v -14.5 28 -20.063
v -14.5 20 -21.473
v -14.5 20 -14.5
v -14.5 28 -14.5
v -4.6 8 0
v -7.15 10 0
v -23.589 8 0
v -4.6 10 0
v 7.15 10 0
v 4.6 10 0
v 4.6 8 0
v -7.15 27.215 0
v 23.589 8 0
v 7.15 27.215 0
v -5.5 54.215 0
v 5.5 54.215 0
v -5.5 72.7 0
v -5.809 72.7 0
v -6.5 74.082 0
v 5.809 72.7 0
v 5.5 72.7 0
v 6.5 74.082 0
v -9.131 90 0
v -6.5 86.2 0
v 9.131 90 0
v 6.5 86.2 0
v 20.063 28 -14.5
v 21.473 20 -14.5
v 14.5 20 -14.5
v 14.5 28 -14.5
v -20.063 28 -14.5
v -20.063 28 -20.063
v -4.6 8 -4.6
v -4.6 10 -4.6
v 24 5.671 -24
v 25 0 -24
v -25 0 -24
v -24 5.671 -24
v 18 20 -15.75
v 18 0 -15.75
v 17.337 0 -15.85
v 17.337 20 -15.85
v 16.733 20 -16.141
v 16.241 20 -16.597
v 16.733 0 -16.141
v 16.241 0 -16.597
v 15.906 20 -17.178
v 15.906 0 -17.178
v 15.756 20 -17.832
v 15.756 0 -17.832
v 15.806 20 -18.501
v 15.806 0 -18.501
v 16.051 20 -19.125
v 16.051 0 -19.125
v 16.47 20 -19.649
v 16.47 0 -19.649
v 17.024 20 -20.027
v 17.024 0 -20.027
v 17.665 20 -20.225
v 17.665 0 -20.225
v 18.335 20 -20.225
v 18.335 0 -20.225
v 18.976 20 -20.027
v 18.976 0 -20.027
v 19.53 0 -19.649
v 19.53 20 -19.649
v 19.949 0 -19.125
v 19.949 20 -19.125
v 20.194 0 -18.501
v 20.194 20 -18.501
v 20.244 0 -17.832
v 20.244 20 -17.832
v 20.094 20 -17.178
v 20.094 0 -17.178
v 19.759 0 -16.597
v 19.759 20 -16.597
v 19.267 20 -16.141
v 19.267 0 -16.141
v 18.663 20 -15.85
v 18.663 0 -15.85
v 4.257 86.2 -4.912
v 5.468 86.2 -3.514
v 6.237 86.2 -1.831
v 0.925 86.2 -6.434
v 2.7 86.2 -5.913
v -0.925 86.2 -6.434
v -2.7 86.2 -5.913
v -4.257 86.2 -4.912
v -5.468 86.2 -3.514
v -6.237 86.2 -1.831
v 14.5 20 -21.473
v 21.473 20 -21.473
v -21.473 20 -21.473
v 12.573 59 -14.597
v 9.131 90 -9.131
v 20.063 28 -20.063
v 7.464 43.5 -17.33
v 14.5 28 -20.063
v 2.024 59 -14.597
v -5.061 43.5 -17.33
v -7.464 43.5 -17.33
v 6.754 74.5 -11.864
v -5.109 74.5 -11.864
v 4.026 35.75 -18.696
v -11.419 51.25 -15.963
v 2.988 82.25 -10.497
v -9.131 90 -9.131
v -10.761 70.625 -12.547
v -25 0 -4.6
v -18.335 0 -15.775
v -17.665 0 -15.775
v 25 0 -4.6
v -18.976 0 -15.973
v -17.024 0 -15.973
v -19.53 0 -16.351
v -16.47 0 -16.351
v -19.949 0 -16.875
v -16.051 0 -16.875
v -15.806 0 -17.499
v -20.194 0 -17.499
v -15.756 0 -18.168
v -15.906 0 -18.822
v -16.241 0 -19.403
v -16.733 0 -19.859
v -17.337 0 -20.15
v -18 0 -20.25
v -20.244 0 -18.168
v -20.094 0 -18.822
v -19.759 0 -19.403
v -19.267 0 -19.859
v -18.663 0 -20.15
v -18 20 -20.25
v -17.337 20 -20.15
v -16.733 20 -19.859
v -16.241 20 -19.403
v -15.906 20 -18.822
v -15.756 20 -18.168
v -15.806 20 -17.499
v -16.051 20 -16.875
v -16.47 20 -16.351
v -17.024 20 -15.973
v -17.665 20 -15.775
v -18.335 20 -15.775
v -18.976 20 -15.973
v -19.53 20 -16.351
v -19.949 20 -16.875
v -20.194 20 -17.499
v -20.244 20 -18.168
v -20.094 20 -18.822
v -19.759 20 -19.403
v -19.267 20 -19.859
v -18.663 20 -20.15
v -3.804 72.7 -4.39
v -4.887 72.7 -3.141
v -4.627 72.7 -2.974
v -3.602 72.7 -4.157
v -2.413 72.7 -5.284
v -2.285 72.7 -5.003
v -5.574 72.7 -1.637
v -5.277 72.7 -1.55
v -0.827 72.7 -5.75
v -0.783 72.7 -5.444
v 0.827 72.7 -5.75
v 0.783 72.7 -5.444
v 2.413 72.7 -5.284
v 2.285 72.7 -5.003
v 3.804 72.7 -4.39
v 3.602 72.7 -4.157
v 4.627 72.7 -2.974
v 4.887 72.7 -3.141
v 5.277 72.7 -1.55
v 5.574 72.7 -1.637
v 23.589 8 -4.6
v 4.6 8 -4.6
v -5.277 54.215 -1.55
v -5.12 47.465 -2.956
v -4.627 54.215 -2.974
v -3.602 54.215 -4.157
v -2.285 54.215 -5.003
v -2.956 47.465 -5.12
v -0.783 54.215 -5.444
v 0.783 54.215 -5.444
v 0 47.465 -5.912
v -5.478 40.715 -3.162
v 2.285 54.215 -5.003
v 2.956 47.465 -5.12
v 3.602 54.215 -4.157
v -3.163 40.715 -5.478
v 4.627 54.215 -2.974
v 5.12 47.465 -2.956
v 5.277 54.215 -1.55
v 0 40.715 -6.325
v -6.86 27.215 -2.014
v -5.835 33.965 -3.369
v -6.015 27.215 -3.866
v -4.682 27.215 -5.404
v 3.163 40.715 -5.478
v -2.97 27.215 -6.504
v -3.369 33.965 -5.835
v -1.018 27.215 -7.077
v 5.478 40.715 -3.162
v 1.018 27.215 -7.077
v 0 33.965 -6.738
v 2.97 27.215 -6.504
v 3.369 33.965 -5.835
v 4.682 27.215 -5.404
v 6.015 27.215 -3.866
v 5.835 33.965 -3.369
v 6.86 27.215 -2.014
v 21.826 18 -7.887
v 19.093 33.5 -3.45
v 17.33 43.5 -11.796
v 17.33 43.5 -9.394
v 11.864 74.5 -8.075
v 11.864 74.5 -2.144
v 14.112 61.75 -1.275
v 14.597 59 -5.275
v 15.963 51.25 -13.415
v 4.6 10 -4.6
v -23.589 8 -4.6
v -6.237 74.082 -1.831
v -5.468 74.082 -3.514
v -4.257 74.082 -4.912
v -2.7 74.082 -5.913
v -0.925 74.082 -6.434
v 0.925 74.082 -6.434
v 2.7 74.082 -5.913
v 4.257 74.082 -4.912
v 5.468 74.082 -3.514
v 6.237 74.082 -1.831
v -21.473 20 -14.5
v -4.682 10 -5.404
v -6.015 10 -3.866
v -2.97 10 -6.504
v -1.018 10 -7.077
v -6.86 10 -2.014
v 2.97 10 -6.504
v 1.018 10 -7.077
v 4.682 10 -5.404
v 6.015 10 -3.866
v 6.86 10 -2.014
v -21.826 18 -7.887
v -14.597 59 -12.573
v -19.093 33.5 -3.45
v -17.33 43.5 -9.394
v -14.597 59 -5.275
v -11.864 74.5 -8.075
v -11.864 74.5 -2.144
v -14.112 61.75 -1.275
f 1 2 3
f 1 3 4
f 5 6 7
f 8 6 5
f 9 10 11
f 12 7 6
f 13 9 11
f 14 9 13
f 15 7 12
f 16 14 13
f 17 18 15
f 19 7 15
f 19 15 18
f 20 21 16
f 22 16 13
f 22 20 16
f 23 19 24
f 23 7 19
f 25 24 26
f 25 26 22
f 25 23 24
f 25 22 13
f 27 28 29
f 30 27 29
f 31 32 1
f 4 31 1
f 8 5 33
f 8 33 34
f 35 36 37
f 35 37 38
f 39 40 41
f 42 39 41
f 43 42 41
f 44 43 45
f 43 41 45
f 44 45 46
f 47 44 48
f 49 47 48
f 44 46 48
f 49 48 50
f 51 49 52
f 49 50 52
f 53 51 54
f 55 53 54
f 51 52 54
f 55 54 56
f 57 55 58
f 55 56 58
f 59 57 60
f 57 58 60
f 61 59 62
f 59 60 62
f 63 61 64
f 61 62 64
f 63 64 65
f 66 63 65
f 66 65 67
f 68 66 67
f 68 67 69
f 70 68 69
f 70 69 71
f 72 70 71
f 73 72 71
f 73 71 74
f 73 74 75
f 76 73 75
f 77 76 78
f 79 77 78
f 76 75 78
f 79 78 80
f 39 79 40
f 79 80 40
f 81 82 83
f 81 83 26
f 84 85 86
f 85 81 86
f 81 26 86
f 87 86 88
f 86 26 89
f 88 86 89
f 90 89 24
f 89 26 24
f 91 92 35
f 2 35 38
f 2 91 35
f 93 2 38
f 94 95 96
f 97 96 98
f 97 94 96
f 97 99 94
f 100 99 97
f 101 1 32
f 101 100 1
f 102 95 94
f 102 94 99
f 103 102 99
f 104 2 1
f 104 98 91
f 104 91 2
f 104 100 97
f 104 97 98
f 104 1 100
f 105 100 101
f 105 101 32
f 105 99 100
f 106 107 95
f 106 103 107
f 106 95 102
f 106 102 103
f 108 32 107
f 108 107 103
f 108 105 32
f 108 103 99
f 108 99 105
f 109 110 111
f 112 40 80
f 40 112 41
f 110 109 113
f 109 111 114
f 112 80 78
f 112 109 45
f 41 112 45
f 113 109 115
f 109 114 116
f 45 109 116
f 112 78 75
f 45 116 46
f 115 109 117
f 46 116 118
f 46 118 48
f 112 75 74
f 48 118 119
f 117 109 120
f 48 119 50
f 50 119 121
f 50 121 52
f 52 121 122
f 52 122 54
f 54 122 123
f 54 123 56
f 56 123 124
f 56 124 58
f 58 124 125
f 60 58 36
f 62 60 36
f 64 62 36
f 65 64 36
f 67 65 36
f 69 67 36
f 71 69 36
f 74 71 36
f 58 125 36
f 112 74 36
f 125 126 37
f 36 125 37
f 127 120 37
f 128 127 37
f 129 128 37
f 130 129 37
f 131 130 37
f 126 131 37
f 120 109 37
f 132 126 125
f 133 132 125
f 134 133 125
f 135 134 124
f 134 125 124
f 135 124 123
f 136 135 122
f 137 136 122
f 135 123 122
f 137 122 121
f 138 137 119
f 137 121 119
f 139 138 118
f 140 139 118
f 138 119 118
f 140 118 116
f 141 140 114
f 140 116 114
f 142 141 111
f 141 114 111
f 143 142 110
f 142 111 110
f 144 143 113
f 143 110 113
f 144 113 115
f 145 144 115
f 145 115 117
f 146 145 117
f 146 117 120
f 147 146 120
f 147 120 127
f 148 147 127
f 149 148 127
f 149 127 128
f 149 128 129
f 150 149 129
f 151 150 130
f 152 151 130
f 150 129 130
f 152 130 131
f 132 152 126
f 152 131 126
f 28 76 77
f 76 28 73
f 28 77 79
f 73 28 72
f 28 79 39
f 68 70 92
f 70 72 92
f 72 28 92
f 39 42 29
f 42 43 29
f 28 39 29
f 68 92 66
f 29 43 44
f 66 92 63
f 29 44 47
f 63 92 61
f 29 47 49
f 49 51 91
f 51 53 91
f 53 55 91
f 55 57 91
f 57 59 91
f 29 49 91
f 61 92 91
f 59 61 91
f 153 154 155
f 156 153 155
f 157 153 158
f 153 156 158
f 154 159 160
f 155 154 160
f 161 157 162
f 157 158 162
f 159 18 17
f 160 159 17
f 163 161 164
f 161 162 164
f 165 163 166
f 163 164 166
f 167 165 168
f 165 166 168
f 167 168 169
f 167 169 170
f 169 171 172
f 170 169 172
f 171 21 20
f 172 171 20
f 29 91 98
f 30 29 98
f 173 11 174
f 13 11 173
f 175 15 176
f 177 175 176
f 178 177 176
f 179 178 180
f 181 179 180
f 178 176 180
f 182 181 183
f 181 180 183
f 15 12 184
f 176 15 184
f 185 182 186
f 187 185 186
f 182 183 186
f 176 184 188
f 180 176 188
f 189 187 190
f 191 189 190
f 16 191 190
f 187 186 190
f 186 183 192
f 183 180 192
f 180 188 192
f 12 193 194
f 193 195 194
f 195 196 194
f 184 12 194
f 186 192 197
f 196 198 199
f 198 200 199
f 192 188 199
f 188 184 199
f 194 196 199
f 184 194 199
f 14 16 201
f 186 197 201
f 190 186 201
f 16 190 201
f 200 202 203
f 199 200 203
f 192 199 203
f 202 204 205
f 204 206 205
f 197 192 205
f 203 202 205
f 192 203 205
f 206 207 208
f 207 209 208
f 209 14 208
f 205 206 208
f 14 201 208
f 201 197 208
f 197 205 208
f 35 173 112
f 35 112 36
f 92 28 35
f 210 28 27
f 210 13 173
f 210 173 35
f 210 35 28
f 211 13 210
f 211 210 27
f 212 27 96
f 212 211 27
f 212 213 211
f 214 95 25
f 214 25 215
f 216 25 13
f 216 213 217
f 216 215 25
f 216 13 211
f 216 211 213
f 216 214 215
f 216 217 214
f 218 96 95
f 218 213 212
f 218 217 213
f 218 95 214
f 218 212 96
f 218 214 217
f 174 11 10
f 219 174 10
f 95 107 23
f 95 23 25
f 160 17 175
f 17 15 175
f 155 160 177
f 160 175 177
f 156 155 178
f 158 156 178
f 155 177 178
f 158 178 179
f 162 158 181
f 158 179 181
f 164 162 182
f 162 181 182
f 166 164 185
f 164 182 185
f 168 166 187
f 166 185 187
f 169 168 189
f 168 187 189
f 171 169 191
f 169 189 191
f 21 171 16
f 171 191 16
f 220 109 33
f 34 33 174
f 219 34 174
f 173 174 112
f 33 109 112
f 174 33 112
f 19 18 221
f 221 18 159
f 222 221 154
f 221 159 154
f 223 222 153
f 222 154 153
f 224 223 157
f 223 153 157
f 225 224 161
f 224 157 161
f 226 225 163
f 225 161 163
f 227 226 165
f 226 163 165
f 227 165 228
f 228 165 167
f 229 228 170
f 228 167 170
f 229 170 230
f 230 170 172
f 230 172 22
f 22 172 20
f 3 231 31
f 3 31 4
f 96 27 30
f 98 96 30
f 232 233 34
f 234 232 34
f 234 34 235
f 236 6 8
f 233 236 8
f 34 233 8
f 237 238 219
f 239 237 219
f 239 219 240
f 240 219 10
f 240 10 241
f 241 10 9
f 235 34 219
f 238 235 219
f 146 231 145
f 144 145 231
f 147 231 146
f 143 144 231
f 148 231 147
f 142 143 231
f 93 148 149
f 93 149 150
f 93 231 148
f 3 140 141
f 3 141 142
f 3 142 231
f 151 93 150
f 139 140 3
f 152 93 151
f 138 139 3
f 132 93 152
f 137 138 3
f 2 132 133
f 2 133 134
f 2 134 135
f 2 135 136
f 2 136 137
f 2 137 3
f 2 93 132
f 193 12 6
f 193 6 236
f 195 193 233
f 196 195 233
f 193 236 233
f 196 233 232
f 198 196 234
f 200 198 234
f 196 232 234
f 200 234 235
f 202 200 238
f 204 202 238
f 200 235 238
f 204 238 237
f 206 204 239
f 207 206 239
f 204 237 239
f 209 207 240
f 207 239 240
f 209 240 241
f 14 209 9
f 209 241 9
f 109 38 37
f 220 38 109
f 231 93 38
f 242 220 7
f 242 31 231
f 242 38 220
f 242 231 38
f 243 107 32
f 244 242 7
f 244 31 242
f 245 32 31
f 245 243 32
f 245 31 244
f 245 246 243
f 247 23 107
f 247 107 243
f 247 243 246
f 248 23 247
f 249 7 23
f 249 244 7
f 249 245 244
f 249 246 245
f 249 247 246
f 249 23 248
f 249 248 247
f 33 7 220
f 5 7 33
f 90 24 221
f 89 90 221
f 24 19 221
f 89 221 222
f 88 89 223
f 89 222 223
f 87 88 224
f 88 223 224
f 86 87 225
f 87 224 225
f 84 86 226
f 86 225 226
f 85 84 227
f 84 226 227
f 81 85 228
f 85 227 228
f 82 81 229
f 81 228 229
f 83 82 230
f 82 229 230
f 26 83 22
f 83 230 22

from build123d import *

# Parameters (mm, degrees)
SKETCH_2_W               = 50
SKETCH_2_H               = 50
EXTRUDE_1_DEPTH          = 90
EXTRUDE_1_TAPER          = 10
SKETCH_3_W               = 215.720321278
SKETCH_3_H               = 290.879799434
CUT_EXTRUDE_1_DEPTH      = 97.695398174
SKETCH_7_W               = 4.6
SKETCH_7_H               = 23.792731937
SKETCH_8_W               = 50
SKETCH_8_H               = 4.6
CUT_EXTRUDE_2_DEPTH      = 8
SKETCH_9_W               = 9.2
SKETCH_9_H               = 9.2
CUT_EXTRUDE_3_DEPTH      = 4.6
SKETCH_10_W              = 7
SKETCH_10_H              = 8
CUT_EXTRUDE_4_DEPTH      = 10.5
SKETCH_11_R              = 2.25
CUT_EXTRUDE_5_DEPTH      = 20
CUT_EXTRUDE_6_DEPTH      = 97.695398174
CUT_EXTRUDE_6_DEPTH_BACK = 97.695398174
SKETCH_12_W              = 75.055418853
SKETCH_12_H              = 23.361905794


with BuildPart() as part:
    # 草圖2 → 填料-伸長1 (new body)
    with BuildSketch(Plane(origin=(0, 0, 0), x_dir=(1, 0, 0), z_dir=(0, 1, 0))):
        Rectangle(SKETCH_2_W, SKETCH_2_H)
    extrude(amount=EXTRUDE_1_DEPTH, taper=EXTRUDE_1_TAPER)

    # 草圖3 → 除料-伸長1 (cut, through all)
    with BuildSketch(Plane.XY):
        Rectangle(SKETCH_3_W, SKETCH_3_H)
    extrude(amount=CUT_EXTRUDE_1_DEPTH, mode=Mode.SUBTRACT)


with BuildPart() as body_2:
    # stick_antenna_434MHz: read off the stored shape, not the designer's step
    # stick_antenna_434MHz outline → stick_antenna_434MHz (revolve)
    with BuildSketch(Plane.XY):
        Polygon((0, 86.2), (0, 10), (6.65, 10), (6.65, 27.2), (5, 54.2), (5, 73.2), (5.5, 73.2), (6, 74.2), (6, 86.2), align=None)
    revolve(axis=Axis((0, 0, 0), (0, 1, 0)))


with BuildPart() as part_1:
    add(part.part)

    # Other 1: read off the stored shape, not the designer's step
    # Other 1: cut body 2
    add(body_2.part, mode=Mode.SUBTRACT)

    # 草圖14 → 除料-旋轉2 (revolve, cut)
    with BuildSketch(Plane.XY):
        Polygon((7.15, 10), (0, 10), (0, 86.2), (6.5, 86.2), (6.5, 74.081966011), (5.809016994, 72.7), (5.5, 72.7), (5.5, 54.21526354), (7.15, 27.21526354), align=None)
    revolve(axis=Axis((0, 88.093709872, 0), (0, -1, 0)), mode=Mode.SUBTRACT)

    # 草圖7 → 除料-旋轉1 (revolve, cut)
    with BuildSketch(Plane.XY):
        with Locations((2.3, 11.896365969)):
            Rectangle(SKETCH_7_W, SKETCH_7_H)
    revolve(axis=Axis((0, 30.263839144, 0), (0, -1, 0)), mode=Mode.SUBTRACT)

    # 草圖8 → 除料-伸長2 (cut)
    with BuildSketch(Plane.XZ):
        with Locations((0, -2.3)):
            Rectangle(SKETCH_8_W, SKETCH_8_H)
    extrude(amount=-CUT_EXTRUDE_2_DEPTH, mode=Mode.SUBTRACT)

    # 草圖9 → 除料-伸長3 (cut)
    with BuildSketch(Plane.XY):
        with Locations((0, 5.4)):
            Rectangle(SKETCH_9_W, SKETCH_9_H)
    extrude(amount=-CUT_EXTRUDE_3_DEPTH, mode=Mode.SUBTRACT)

    # 草圖10 → 除料-伸長4 (cut)
    with BuildSketch(Plane.XY.offset(-25)):
        with Locations((-18, 24)):
            Rectangle(SKETCH_10_W, SKETCH_10_H)
    cut_extrude_4 = extrude(amount=CUT_EXTRUDE_4_DEPTH, mode=Mode.SUBTRACT)

    # 草圖11 → 除料-伸長5 (cut)
    with BuildSketch(Plane.XZ):
        with Locations(Location((-18, -18, 0), (0, 0, 270))):
            Circle(SKETCH_11_R)
        with Locations(Location((18, -18, 0), (0, 0, 90))):
            Circle(SKETCH_11_R)
    extrude(amount=-CUT_EXTRUDE_5_DEPTH, mode=Mode.SUBTRACT)

    # 鏡射2: 除料-伸長4 across plane
    add(cut_extrude_4.mirror(Plane(origin=(0, 0, 0), x_dir=(0, 0, 1), z_dir=(1, 0, 0))), mode=Mode.SUBTRACT)

    # 草圖12 → 除料-伸長6 (cut, two sides: drawn at the far end of the back side and taken through both)
    with BuildSketch(Plane(origin=(0, 0, 0), x_dir=(0, 0, -1), z_dir=(1, 0, 0)).offset(-CUT_EXTRUDE_6_DEPTH_BACK)):
        with Locations((61.527709427, 0)):
            Rectangle(SKETCH_12_W, SKETCH_12_H)
    extrude(amount=CUT_EXTRUDE_6_DEPTH + CUT_EXTRUDE_6_DEPTH_BACK, mode=Mode.SUBTRACT)


solid = part_1.part
